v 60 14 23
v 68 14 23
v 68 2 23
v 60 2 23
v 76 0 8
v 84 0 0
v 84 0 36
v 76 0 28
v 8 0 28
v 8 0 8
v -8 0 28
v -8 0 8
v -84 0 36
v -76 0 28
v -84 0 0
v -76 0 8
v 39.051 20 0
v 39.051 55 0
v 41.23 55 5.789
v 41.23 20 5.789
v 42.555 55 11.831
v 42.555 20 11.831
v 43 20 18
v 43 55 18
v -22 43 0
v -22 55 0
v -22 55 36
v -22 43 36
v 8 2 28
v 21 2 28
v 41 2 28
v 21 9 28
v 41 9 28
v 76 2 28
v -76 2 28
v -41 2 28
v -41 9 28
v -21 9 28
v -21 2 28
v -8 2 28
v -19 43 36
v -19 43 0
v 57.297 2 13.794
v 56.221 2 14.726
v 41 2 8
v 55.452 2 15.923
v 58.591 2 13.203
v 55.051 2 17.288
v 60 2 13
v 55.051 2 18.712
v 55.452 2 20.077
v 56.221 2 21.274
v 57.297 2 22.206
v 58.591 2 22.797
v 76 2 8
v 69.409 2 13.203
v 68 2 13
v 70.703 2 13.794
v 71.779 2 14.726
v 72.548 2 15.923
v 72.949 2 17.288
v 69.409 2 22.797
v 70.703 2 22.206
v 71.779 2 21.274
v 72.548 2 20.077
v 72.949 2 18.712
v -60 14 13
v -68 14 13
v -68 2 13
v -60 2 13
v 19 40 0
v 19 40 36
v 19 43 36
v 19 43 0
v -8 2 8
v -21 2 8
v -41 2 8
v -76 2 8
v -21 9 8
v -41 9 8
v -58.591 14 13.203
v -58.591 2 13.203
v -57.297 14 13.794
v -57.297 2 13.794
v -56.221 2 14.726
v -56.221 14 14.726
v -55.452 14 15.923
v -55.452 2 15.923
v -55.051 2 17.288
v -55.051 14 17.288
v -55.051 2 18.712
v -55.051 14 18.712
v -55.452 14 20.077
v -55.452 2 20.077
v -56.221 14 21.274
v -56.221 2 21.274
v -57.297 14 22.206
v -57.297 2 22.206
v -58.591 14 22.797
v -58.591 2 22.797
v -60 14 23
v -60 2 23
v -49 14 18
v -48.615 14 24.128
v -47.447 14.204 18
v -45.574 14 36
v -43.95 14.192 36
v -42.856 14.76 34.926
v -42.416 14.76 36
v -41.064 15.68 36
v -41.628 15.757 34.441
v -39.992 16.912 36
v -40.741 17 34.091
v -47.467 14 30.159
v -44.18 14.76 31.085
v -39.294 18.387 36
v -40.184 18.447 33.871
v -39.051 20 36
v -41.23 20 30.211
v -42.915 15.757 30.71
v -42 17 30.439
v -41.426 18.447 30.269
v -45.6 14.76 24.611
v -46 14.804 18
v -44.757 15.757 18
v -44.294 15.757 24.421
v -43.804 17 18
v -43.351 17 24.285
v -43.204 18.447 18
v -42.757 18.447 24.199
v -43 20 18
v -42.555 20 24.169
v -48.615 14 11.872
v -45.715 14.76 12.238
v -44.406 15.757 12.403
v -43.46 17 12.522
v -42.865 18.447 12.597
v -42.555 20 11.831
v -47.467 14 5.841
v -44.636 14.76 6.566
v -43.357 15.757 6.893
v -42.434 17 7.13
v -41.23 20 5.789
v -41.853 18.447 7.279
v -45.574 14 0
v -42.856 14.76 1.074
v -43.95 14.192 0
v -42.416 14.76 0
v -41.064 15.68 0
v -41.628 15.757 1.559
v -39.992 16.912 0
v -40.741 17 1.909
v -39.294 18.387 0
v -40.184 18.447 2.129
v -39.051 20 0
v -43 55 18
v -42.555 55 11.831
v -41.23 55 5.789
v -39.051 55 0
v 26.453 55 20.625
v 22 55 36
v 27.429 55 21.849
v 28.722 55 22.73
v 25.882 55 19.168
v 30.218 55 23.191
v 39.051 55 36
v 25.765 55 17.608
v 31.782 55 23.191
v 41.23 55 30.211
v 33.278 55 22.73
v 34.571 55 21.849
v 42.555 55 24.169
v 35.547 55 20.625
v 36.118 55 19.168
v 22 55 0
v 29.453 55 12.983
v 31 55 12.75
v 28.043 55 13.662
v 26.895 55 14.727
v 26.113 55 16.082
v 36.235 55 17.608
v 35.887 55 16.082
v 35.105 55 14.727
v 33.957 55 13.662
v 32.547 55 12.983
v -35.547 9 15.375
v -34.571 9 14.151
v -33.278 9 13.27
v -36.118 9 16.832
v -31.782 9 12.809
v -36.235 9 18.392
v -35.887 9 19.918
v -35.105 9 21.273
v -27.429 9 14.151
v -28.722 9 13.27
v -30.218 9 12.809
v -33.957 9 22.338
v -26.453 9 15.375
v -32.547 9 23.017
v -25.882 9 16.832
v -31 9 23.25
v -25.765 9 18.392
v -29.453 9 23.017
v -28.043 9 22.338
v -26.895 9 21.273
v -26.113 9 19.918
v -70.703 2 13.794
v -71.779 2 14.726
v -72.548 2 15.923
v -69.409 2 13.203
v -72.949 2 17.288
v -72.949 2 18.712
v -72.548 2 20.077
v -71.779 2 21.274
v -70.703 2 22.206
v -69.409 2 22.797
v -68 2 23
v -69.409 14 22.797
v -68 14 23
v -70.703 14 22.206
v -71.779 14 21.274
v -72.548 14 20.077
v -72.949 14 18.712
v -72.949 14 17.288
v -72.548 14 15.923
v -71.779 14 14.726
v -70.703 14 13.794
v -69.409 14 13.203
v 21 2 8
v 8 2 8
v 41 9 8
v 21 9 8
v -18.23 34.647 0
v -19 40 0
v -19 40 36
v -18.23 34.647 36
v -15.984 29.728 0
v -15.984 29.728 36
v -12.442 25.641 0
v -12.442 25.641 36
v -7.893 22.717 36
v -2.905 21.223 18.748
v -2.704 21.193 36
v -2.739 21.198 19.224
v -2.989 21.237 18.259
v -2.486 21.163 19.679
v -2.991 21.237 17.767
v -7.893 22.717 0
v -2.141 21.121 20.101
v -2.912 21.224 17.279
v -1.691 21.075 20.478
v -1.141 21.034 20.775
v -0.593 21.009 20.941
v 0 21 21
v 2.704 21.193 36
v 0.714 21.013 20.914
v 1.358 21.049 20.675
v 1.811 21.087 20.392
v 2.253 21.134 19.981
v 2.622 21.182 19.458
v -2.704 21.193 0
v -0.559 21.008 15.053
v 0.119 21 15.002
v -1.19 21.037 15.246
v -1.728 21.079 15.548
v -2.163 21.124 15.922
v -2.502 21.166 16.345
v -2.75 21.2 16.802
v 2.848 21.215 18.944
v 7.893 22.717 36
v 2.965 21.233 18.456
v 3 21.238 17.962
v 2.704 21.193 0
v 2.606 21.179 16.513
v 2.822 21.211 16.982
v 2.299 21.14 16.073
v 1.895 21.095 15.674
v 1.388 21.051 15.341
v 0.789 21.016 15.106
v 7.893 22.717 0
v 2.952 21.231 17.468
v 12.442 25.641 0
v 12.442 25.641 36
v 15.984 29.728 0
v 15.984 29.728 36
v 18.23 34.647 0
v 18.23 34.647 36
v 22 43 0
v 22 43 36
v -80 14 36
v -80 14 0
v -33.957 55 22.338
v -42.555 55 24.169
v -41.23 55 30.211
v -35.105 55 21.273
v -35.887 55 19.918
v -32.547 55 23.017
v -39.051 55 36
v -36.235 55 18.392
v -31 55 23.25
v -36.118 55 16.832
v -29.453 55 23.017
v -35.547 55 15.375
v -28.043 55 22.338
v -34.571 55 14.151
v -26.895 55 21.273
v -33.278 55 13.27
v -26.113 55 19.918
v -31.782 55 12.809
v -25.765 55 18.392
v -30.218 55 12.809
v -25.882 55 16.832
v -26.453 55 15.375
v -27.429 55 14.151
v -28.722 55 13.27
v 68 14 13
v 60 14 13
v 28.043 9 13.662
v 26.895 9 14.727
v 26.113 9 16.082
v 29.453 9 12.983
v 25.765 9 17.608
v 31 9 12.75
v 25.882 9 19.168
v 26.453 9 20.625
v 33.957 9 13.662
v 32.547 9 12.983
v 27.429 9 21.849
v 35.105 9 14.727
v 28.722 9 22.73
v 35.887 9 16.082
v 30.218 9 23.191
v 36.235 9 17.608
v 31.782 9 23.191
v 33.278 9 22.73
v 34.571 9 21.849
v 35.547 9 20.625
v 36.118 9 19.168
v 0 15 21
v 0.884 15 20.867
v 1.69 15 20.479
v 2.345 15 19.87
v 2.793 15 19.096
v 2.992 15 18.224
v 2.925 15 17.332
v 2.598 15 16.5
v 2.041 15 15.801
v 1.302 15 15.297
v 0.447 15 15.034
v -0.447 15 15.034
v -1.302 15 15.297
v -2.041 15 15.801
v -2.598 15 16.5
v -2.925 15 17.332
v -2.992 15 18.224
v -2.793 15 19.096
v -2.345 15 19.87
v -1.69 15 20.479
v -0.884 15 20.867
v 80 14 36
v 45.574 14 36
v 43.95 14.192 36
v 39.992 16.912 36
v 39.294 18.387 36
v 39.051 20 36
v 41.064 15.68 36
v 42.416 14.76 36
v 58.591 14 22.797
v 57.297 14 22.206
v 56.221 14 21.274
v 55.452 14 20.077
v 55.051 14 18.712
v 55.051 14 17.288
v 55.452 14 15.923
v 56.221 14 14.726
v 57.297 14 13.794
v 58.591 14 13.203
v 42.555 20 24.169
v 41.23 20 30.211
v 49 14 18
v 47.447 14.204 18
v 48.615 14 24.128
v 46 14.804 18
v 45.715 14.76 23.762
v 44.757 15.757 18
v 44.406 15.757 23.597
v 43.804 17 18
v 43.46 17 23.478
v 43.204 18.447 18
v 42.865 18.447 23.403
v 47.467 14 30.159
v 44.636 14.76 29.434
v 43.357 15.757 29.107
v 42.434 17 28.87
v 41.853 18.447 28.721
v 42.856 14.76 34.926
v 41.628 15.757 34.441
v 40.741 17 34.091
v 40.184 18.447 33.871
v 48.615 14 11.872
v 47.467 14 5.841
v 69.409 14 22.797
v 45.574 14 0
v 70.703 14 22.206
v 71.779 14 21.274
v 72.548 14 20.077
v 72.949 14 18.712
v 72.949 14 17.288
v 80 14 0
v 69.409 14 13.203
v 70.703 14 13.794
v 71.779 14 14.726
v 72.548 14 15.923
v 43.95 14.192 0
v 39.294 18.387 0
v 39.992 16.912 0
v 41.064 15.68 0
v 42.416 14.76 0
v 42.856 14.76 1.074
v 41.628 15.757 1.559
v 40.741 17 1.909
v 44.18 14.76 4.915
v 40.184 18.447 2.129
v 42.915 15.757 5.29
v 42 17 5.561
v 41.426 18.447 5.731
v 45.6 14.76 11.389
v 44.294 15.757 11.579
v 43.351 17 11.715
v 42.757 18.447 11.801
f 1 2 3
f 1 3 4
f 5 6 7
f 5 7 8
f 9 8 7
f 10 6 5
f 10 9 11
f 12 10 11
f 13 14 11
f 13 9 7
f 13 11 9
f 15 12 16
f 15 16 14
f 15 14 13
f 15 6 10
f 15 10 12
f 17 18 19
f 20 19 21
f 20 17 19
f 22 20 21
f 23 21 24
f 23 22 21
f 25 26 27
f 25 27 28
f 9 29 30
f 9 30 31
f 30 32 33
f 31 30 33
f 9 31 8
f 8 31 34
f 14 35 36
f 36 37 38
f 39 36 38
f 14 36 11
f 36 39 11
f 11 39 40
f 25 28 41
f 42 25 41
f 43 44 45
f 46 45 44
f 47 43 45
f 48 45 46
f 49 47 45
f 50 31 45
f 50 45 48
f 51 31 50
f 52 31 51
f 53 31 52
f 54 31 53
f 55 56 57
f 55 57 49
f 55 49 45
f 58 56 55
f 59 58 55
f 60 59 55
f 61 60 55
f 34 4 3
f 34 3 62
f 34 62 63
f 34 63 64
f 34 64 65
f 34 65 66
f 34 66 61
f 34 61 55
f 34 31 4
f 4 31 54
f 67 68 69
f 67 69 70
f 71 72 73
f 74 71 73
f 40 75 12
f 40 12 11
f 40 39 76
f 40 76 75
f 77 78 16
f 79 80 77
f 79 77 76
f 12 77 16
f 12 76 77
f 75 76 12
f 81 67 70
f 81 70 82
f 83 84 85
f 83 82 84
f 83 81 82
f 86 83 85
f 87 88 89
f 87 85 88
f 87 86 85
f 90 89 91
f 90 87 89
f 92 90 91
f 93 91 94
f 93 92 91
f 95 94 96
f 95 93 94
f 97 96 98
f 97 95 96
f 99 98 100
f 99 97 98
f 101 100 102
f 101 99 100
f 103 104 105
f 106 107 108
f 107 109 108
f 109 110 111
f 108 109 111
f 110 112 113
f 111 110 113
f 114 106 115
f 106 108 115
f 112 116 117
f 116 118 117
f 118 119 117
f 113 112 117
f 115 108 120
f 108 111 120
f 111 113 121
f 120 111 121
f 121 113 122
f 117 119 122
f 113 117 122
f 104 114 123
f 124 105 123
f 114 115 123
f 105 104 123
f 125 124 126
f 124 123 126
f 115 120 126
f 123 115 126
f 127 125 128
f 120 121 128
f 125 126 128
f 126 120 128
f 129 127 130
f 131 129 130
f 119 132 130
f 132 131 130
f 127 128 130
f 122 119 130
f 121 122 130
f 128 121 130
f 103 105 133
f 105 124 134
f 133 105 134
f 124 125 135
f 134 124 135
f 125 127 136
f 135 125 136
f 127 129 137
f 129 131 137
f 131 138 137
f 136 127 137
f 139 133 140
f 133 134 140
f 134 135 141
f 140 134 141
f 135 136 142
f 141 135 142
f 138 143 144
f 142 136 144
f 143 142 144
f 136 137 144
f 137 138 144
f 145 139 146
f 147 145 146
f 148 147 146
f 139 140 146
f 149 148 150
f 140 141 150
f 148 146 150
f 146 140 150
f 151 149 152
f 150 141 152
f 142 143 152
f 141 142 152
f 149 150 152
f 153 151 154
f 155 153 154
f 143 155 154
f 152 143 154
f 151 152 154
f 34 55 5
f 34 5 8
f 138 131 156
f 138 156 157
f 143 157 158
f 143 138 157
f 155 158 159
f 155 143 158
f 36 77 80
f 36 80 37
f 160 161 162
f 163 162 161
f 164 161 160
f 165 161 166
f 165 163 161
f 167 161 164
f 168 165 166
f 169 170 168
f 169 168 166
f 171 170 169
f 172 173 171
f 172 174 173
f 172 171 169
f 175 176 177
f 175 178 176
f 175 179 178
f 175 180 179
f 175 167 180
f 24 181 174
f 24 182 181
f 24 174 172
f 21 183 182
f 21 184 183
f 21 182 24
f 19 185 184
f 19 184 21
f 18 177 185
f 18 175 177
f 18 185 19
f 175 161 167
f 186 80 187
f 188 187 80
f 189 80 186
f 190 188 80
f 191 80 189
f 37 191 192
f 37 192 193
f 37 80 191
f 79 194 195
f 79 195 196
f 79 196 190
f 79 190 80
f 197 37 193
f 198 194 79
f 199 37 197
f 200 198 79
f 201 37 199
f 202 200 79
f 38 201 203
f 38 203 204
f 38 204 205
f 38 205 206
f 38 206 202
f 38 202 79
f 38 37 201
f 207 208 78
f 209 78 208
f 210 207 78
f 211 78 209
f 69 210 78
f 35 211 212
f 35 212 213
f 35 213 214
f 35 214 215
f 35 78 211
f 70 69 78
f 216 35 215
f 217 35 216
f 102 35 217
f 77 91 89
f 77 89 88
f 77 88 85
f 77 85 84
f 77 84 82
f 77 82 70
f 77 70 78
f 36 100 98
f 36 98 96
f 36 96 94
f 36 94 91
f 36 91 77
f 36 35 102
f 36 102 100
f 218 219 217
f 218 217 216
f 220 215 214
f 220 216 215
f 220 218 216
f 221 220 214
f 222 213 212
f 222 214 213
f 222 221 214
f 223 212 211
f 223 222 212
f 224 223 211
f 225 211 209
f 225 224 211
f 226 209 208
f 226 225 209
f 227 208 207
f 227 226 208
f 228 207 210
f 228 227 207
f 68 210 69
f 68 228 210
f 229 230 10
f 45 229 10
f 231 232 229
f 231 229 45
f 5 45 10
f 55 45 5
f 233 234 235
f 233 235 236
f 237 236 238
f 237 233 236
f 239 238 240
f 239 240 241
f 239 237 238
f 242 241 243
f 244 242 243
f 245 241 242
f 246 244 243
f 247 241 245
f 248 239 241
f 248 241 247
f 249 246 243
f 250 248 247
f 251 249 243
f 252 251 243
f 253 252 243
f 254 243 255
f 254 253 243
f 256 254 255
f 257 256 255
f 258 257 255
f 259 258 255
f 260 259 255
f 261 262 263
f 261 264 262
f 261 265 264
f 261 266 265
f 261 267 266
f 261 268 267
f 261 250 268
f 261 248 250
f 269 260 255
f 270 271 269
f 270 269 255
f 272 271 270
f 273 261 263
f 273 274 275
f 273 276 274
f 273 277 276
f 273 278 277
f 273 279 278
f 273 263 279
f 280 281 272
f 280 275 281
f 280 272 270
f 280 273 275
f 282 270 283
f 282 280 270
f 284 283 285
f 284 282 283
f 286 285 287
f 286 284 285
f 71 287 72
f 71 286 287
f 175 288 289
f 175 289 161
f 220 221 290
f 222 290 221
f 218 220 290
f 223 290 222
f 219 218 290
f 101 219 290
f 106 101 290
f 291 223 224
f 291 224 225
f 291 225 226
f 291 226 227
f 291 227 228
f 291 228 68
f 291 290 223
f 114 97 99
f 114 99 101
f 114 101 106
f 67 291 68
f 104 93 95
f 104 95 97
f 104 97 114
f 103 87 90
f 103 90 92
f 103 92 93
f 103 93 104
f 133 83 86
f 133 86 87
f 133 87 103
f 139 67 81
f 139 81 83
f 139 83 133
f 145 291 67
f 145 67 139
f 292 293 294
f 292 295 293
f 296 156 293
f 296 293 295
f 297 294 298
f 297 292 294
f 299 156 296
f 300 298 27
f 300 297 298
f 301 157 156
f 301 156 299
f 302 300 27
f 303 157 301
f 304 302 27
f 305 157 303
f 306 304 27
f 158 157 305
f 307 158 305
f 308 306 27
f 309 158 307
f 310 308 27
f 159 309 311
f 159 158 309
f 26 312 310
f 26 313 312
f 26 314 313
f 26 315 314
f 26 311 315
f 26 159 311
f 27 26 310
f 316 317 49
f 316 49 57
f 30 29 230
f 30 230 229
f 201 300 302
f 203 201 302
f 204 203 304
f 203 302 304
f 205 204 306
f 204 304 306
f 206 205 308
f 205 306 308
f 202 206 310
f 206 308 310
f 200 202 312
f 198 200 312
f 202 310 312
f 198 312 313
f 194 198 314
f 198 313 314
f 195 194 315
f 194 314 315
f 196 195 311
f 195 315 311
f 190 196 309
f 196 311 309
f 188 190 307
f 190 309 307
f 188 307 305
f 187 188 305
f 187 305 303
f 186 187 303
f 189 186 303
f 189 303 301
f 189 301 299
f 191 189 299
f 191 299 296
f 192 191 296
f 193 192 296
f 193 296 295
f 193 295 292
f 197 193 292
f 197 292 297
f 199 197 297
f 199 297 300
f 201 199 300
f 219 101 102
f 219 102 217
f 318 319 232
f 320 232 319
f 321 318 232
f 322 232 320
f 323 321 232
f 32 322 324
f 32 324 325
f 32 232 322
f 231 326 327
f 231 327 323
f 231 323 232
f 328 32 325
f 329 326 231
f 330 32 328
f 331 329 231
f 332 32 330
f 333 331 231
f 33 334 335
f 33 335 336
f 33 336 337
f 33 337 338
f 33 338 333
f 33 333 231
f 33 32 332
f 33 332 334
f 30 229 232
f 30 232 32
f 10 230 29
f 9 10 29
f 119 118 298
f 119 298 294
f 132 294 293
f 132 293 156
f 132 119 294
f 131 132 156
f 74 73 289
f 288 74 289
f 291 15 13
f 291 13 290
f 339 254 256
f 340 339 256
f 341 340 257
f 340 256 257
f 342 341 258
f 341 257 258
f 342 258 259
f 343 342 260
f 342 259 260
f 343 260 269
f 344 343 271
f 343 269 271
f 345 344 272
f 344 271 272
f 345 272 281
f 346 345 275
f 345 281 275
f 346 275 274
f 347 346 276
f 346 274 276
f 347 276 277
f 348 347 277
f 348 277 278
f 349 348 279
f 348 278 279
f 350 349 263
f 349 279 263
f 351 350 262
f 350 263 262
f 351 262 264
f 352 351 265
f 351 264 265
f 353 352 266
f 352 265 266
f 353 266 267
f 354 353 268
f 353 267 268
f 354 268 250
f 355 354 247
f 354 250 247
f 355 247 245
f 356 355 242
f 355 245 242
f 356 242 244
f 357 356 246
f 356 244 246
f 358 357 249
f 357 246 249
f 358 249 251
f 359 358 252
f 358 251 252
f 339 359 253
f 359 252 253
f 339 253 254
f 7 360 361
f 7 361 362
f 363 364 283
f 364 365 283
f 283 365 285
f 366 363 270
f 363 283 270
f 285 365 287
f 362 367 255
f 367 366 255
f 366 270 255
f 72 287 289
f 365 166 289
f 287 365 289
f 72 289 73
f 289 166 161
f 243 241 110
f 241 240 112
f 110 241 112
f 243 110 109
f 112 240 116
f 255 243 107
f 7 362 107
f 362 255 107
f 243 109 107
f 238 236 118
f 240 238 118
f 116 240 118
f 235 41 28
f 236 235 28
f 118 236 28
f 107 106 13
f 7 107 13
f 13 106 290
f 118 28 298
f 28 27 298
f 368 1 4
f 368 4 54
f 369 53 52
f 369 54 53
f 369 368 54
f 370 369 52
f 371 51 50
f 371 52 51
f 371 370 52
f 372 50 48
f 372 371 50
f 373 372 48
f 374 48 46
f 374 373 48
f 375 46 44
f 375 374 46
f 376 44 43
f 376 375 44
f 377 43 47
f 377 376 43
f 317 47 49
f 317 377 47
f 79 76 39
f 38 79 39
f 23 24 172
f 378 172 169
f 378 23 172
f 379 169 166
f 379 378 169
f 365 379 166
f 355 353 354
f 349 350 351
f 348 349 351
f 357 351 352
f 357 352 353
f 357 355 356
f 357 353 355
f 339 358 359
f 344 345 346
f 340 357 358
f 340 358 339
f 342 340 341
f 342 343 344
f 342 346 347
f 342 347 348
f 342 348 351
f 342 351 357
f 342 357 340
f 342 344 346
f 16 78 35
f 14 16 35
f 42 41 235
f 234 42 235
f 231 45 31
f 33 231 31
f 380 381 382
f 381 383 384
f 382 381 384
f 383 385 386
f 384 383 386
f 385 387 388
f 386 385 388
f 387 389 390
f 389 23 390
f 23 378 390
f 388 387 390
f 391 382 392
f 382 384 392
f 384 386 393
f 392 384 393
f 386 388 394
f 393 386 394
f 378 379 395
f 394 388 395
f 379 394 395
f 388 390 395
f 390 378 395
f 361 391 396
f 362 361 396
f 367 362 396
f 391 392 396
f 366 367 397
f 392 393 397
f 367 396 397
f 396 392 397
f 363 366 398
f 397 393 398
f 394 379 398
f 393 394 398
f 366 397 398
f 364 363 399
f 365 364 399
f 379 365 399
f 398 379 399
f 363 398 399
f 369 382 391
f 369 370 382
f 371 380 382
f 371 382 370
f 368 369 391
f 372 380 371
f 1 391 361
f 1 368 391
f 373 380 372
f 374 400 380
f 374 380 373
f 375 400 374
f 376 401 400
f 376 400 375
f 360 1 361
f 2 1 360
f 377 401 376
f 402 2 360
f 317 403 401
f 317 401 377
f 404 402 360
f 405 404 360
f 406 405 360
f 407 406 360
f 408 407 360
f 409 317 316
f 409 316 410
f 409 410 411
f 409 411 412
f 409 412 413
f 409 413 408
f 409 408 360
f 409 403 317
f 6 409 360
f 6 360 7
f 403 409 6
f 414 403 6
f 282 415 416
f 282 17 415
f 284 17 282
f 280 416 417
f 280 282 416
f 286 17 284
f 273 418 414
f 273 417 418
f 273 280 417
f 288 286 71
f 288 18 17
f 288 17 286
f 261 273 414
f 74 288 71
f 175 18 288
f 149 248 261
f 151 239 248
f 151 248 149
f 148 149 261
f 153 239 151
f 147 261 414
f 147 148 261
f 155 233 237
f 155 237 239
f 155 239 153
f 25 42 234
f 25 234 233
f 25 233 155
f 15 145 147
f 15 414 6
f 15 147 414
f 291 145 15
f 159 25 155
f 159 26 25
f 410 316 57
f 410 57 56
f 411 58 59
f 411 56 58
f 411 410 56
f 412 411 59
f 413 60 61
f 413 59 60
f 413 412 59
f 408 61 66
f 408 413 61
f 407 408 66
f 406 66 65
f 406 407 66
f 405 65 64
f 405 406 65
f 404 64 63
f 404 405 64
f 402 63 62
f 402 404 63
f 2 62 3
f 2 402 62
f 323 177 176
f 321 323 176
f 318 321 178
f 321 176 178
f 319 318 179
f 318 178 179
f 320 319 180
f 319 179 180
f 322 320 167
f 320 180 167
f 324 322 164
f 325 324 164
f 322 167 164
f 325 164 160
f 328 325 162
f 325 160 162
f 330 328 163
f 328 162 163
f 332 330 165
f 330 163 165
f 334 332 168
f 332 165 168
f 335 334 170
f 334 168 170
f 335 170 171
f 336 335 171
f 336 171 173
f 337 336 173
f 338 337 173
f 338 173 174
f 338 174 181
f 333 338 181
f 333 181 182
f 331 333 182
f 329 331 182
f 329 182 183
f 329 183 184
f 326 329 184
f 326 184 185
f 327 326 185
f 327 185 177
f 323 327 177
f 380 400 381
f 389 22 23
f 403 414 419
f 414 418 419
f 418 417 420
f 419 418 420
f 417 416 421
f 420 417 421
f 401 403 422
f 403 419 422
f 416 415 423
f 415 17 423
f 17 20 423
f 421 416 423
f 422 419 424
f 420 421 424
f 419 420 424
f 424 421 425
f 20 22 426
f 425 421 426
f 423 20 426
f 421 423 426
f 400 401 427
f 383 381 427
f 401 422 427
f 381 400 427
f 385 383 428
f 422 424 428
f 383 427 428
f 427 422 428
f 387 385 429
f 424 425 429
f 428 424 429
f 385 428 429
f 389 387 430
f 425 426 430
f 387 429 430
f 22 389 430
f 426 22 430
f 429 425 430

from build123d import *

# Parameters (mm, degrees)
BOSS_EXTRUDE1_DEPTH = 36
CUT_EXTRUDE1_DEPTH  = 36
CUT_EXTRUDE2_DEPTH  = 36
SKETCH5_R           = 5.25
CUT_EXTRUDE3_DEPTH  = 107.663020771
CUT_EXTRUDE4_START  = -2
SKETCH6_W           = 68
SKETCH6_H           = 20
SKETCH6_R           = 5.25
CUT_EXTRUDE4_DEPTH  = 2
CUT_EXTRUDE5_START  = -41
CUT_EXTRUDE5_DEPTH  = 41
SKETCH9_R           = 3
CUT_EXTRUDE15_DEPTH = 6
FILLET1_R           = 6
FILLET2_R           = 6
SKETCH11_W          = 20
SKETCH11_H          = 20
CUT_EXTRUDE19_DEPTH = 7
SKETCH13_W          = 20
SKETCH13_H          = 20
CUT_EXTRUDE20_DEPTH = 7


# Read off the part's stored shape, not the designer's step: Cut-Extrude5
with BuildPart() as part:
    # Sketch1 → Boss-Extrude1 (new body)
    with BuildSketch(Plane.XY):
        with BuildLine():
            Line((84, 0), (-84, 0))
            Line((-84, 0), (-80, 14))
            Line((-80, 14), (-43, 14))
            Line((-43, 14), (-43, 55))
            Line((-43, 55), (-22, 55))
            Line((-22, 55), (-22, 43))
            Line((-22, 43), (-19, 43))
            Line((-19, 43), (-19, 40))
            ThreePointArc((-19, 40), (0, 21), (19, 40))
            Line((19, 40), (19, 43))
            Line((19, 43), (22, 43))
            Line((22, 43), (22, 55))
            Line((22, 55), (43, 55))
            Line((43, 55), (43, 14))
            Line((43, 14), (80, 14))
            Line((80, 14), (84, 0))
        make_face()
    extrude(amount=BOSS_EXTRUDE1_DEPTH)

    # Sketch2 → Cut-Extrude1 (cut)
    with BuildSketch(Plane(origin=(0, 14, 0), x_dir=(1, 0, 0), z_dir=(0, 1, 0))):
        with BuildLine():
            Line((60, -13), (68, -13))
            ThreePointArc((68, -13), (73, -18), (68, -23))
            Line((68, -23), (60, -23))
            ThreePointArc((60, -23), (55, -18), (60, -13))
        make_face()
    extrude(amount=-CUT_EXTRUDE1_DEPTH, mode=Mode.SUBTRACT)

    # Sketch4 → Cut-Extrude2 (cut)
    with BuildSketch(Plane(origin=(0, 14, 0), x_dir=(1, 0, 0), z_dir=(0, 1, 0))):
        with BuildLine():
            Line((-60, -23), (-68, -23))
            ThreePointArc((-68, -23), (-73, -18), (-68, -13))
            Line((-68, -13), (-60, -13))
            ThreePointArc((-60, -13), (-55, -18), (-60, -23))
        make_face()
    extrude(amount=-CUT_EXTRUDE2_DEPTH, mode=Mode.SUBTRACT)

    # Sketch5 → Cut-Extrude3 (cut, through all)
    with BuildSketch(Plane(origin=(0, 55, 0), x_dir=(1, 0, 0), z_dir=(0, 1, 0))):
        with Locations(Location((-31, -18, 0), (0, 0, 270))):
            Circle(SKETCH5_R)
        with Locations(Location((31, -18, 0), (0, 0, 90))):
            Circle(SKETCH5_R)
    extrude(amount=-CUT_EXTRUDE3_DEPTH, mode=Mode.SUBTRACT)

    # Sketch6 → Cut-Extrude4 (cut)
    # profile 1 of 2: a face of its own
    with BuildSketch(Plane.XZ.offset(CUT_EXTRUDE4_START)):
        with Locations((-42, 18)):
            Rectangle(SKETCH6_W, SKETCH6_H)
        with Locations(Location((-31, 18, 0), (0, 0, 90))):
            Circle(SKETCH6_R, mode=Mode.SUBTRACT)
        with BuildLine():
            ThreePointArc((-68, 13), (-73, 18), (-68, 23))
            Line((-68, 23), (-60, 23))
            ThreePointArc((-60, 23), (-55, 18), (-60, 13))
            Line((-60, 13), (-68, 13))
        make_face(mode=Mode.SUBTRACT)
    # profile 2 of 2: a face of its own
    with BuildSketch(Plane.XZ.offset(CUT_EXTRUDE4_START)):
        with Locations((42, 18)):
            Rectangle(SKETCH6_W, SKETCH6_H)
        with Locations(Location((31, 18, 0), (0, 0, 270))):
            Circle(SKETCH6_R, mode=Mode.SUBTRACT)
        with BuildLine():
            ThreePointArc((68, 23), (73, 18), (68, 13))
            Line((68, 13), (60, 13))
            ThreePointArc((60, 13), (55, 18), (60, 23))
            Line((60, 23), (68, 23))
        make_face(mode=Mode.SUBTRACT)
    extrude(amount=CUT_EXTRUDE4_DEPTH, mode=Mode.SUBTRACT)

    # Cut-Extrude5 outline → Cut-Extrude5 (cut)
    with BuildSketch(Plane(origin=(0, 55, 0), x_dir=(1, 0, 0), z_dir=(0, 1, 0)).offset(CUT_EXTRUDE5_START)):
        with BuildLine():
            ThreePointArc((43, -18), (42.001212365, -27.214019744), (39.05124838, -36))
            Line((39.05124838, -36), (43, -36))
            Line((43, -36), (43, -18))
        make_face()
        with BuildLine():
            ThreePointArc((39.05124838, 0), (42.001212365, -8.785980256), (43, -18))
            Line((43, -18), (43, 0))
            Line((43, 0), (39.05124838, 0))
        make_face()
        with BuildLine():
            Line((-43, -36), (-39.05124838, -36))
            ThreePointArc((-39.05124838, -36), (-42.001212365, -27.214019744), (-43, -18))
            Line((-43, -18), (-43, -36))
        make_face()
        with BuildLine():
            Line((-43, 0), (-43, -18))
            ThreePointArc((-43, -18), (-42.001212365, -8.785980256), (-39.05124838, 0))
            Line((-39.05124838, 0), (-43, 0))
        make_face()
    extrude(amount=CUT_EXTRUDE5_DEPTH, mode=Mode.SUBTRACT)

    # Sketch9 → Cut-Extrude15 (cut, symmetric)
    with BuildSketch(Plane(origin=(0, 21, 0), x_dir=(1, 0, 0), z_dir=(0, 1, 0))):
        with Locations(Location((0, -18, 0), (0, 0, 270))):
            Circle(SKETCH9_R)
    extrude(amount=CUT_EXTRUDE15_DEPTH, both=True, mode=Mode.SUBTRACT)

    # Fillet1
    fillet1_edges = [part.edges().sort_by_distance(p)[0] for p in [
        (42.001212365, 14, 27.214019744),
    ]]
    fillet(fillet1_edges, radius=FILLET1_R)

    # Fillet2
    fillet2_edges = [part.edges().sort_by_distance(p)[0] for p in [
        (-42.001212365, 14, 27.214019744),
    ]]
    fillet(fillet2_edges, radius=FILLET2_R)

    # Sketch11 → Cut-Extrude19 (cut)
    with BuildSketch(Plane.XZ.offset(-2)):
        with Locations((-31, 18)):
            Rectangle(SKETCH11_W, SKETCH11_H)
    extrude(amount=-CUT_EXTRUDE19_DEPTH, mode=Mode.SUBTRACT)

    # Sketch13 → Cut-Extrude20 (cut)
    with BuildSketch(Plane.XZ.offset(-2)):
        with Locations((31, 18)):
            Rectangle(SKETCH13_W, SKETCH13_H)
    extrude(amount=-CUT_EXTRUDE20_DEPTH, mode=Mode.SUBTRACT)


solid = part.part
